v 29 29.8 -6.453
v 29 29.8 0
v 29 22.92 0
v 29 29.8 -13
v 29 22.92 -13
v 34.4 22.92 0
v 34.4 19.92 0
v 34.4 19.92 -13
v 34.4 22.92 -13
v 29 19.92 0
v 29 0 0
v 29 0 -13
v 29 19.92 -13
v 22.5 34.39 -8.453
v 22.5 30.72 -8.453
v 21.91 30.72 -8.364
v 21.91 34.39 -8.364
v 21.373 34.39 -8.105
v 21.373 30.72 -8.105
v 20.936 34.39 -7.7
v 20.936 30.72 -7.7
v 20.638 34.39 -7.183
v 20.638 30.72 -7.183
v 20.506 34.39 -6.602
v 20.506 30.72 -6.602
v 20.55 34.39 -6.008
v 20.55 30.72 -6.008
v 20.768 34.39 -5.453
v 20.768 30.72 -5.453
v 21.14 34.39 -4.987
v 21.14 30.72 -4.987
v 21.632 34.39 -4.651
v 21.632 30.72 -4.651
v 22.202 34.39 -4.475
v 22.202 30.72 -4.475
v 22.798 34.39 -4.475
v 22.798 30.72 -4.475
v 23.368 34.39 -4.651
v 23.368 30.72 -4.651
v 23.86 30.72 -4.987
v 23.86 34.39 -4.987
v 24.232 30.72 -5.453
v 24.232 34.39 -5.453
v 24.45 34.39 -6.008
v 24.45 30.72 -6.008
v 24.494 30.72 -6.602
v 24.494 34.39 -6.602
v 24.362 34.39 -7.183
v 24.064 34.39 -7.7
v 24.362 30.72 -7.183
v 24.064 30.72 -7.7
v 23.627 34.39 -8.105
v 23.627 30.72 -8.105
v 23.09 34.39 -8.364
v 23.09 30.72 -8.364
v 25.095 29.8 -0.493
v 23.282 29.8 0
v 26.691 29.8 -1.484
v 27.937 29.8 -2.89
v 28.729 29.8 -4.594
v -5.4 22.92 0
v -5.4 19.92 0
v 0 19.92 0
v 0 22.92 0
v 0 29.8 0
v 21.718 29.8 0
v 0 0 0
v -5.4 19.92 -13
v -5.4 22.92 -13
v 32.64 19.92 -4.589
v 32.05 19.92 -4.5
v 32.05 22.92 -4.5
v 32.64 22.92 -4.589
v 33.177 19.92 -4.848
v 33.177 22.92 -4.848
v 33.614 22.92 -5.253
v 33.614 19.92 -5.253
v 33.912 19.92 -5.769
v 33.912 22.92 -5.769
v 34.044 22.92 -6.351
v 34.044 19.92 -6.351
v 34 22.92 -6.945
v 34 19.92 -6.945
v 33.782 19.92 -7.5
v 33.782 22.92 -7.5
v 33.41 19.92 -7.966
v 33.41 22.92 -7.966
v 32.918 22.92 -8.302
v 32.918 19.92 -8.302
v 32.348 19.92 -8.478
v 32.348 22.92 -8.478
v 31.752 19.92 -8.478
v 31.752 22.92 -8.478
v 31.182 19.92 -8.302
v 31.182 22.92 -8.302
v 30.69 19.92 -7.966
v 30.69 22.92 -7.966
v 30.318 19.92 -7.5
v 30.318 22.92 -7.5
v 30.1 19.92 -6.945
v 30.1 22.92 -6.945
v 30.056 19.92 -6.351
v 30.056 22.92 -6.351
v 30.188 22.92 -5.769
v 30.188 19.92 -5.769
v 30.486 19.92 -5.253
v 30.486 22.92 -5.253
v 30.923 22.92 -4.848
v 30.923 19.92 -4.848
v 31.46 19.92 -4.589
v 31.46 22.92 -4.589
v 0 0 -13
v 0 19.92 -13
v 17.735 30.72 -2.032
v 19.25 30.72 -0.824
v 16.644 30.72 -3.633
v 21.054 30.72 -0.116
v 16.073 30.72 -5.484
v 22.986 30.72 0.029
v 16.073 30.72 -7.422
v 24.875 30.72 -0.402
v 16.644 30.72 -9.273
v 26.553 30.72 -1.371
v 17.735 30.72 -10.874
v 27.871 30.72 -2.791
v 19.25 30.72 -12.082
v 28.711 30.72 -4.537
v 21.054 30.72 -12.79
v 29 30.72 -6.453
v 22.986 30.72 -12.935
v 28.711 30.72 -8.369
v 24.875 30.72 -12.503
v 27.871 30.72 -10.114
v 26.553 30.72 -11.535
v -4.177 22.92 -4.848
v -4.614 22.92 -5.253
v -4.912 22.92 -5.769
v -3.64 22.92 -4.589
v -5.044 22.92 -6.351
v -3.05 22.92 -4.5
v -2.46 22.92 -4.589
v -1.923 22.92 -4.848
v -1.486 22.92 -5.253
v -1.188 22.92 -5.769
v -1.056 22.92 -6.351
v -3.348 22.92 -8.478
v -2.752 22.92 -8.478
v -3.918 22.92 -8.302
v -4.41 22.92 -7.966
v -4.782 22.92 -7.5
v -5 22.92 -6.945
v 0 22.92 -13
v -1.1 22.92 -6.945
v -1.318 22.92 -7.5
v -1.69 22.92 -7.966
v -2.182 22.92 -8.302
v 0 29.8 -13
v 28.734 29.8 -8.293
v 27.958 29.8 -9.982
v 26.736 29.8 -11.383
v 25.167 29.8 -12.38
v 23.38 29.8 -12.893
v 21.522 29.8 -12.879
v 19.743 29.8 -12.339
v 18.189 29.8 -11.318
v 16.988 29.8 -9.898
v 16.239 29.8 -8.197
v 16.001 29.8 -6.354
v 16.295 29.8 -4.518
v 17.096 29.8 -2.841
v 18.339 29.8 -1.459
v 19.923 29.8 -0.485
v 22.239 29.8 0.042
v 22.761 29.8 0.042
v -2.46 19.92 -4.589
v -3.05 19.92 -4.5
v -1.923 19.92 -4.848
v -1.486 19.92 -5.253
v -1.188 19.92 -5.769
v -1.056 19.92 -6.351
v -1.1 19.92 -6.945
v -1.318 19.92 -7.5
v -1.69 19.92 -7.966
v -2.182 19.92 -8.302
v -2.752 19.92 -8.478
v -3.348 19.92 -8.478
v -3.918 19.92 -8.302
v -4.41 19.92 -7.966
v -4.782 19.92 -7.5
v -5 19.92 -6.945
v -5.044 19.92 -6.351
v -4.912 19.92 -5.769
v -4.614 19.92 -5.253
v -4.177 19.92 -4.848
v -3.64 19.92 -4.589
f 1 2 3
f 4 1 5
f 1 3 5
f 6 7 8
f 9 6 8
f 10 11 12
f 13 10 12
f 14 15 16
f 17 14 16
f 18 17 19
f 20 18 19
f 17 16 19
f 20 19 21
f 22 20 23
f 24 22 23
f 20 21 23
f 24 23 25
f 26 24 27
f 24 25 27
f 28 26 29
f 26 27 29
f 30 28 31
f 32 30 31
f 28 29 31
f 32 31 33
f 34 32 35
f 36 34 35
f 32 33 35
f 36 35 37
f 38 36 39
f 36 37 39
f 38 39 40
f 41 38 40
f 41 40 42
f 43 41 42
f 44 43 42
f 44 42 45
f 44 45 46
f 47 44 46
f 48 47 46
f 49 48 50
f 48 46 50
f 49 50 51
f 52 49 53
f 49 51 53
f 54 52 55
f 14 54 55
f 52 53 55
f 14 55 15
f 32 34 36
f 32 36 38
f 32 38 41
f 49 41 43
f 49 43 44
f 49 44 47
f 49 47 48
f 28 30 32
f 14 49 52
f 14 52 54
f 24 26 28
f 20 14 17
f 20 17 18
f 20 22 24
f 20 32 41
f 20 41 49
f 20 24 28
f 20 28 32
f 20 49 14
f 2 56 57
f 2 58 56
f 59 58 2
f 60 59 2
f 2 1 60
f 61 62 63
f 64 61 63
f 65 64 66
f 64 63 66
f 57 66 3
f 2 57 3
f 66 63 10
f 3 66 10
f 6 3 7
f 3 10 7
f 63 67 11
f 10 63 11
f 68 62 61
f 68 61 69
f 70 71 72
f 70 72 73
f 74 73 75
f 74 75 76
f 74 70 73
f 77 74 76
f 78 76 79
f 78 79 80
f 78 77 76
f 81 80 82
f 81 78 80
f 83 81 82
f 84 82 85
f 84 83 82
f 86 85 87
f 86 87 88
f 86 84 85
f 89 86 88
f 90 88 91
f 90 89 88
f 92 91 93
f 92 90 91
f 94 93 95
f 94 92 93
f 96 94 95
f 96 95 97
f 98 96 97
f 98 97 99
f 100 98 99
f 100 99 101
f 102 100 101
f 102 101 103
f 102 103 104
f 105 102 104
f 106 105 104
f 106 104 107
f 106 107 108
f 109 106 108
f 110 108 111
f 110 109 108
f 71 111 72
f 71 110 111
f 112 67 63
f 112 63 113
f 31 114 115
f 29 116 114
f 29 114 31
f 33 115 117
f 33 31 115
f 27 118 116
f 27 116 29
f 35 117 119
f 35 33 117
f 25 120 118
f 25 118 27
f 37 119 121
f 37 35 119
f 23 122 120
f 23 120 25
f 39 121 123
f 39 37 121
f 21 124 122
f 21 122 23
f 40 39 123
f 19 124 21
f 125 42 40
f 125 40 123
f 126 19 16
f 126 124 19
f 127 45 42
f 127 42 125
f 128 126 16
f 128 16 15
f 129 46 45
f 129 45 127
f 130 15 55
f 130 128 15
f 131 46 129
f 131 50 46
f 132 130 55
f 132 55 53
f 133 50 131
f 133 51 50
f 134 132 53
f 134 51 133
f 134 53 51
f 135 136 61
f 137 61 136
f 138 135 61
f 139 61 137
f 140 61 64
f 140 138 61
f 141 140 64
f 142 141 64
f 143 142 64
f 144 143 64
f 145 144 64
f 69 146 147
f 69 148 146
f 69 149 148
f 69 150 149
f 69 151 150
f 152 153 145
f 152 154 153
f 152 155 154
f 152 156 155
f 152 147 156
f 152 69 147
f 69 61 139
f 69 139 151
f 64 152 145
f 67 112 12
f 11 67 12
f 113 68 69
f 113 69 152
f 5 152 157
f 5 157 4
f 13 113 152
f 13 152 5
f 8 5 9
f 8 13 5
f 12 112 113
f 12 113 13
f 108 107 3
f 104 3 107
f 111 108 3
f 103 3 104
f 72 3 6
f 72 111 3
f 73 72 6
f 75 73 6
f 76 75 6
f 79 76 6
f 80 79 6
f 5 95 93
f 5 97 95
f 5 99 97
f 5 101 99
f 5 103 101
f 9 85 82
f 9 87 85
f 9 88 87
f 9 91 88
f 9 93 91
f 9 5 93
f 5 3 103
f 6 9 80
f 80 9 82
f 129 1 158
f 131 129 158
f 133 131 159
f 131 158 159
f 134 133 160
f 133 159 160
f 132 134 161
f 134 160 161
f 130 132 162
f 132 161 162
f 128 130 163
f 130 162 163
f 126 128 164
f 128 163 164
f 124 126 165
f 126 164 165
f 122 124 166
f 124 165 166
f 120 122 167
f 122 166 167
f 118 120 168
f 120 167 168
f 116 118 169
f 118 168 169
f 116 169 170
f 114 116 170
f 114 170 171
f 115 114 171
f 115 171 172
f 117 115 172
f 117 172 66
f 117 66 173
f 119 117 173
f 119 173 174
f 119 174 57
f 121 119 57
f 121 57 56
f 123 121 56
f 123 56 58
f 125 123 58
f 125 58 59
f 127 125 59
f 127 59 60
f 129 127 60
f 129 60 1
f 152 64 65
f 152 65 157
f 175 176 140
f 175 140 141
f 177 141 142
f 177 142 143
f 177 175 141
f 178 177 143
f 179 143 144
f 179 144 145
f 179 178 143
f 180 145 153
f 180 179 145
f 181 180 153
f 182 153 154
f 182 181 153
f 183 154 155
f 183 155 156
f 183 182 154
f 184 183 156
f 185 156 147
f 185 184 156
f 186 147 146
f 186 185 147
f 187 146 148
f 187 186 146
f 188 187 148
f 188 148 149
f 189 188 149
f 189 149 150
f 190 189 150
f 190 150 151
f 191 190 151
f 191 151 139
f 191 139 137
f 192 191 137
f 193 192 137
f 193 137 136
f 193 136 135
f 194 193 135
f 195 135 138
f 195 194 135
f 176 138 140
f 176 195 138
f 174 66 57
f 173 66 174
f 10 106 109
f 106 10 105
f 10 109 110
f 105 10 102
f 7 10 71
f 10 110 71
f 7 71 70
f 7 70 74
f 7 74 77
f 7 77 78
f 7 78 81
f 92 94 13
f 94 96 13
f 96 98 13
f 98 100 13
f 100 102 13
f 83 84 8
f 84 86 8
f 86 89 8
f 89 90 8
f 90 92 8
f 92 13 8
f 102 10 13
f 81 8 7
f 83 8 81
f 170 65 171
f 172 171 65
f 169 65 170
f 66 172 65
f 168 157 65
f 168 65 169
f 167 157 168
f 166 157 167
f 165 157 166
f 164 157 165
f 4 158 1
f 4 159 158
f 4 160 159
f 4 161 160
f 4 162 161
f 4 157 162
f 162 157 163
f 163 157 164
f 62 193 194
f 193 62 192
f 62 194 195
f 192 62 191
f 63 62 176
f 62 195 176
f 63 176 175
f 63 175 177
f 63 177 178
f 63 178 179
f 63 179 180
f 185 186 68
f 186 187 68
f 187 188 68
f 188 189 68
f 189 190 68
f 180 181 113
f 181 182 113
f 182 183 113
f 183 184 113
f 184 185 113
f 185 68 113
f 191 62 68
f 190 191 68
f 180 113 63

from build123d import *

# Parameters (mm, degrees)
SKETCH1_W           = 29
SKETCH1_H           = 13
BOSS_EXTRUDE1_DEPTH = 19.92
SKETCH2_W           = 39.8
SKETCH2_H           = 13
SKETCH2_R           = 2
BOSS_EXTRUDE2_DEPTH = 3
SKETCH3_W           = 29
SKETCH3_H           = 13
BOSS_EXTRUDE3_DEPTH = 6.88
SKETCH4_R           = 6.5
BOSS_EXTRUDE4_DEPTH = 0.92
SKETCH5_R           = 2
BOSS_EXTRUDE5_DEPTH = 3.67


with BuildPart() as part:
    # Sketch1 → Boss-Extrude1 (new body)
    with BuildSketch(Plane(origin=(0, 0, 0), x_dir=(1, 0, 0), z_dir=(0, 1, 0))):
        with Locations((14.5, 6.5)):
            Rectangle(SKETCH1_W, SKETCH1_H)
    extrude(amount=BOSS_EXTRUDE1_DEPTH)

    # Sketch2 → Boss-Extrude2 (add)
    with BuildSketch(Plane(origin=(0, 19.92, 0), x_dir=(1, 0, 0), z_dir=(0, 1, 0))):
        with Locations((14.5, 6.5)):
            Rectangle(SKETCH2_W, SKETCH2_H)
        with Locations(Location((-3.05, 6.5, 0), (0, 0, 270))):
            Circle(SKETCH2_R, mode=Mode.SUBTRACT)
        with Locations(Location((32.05, 6.5, 0), (0, 0, 270))):
            Circle(SKETCH2_R, mode=Mode.SUBTRACT)
    extrude(amount=BOSS_EXTRUDE2_DEPTH)

    # Sketch3 → Boss-Extrude3 (add)
    with BuildSketch(Plane(origin=(0, 22.92, 0), x_dir=(1, 0, 0), z_dir=(0, 1, 0))):
        with Locations((14.5, 6.5)):
            Rectangle(SKETCH3_W, SKETCH3_H)
    extrude(amount=BOSS_EXTRUDE3_DEPTH)

    # Sketch4 → Boss-Extrude4 (add)
    with BuildSketch(Plane(origin=(0, 29.8, 0), x_dir=(1, 0, 0), z_dir=(0, 1, 0))):
        with Locations((22.5, 6.452760886)):
            Circle(SKETCH4_R)
    extrude(amount=BOSS_EXTRUDE4_DEPTH)

    # Sketch5 → Boss-Extrude5 (add)
    with BuildSketch(Plane(origin=(0, 30.72, 0), x_dir=(1, 0, 0), z_dir=(0, 1, 0))):
        with Locations(Location((22.5, 6.452760886, 0), (0, 0, 90))):
            Circle(SKETCH5_R)
    extrude(amount=BOSS_EXTRUDE5_DEPTH)


solid = part.part
